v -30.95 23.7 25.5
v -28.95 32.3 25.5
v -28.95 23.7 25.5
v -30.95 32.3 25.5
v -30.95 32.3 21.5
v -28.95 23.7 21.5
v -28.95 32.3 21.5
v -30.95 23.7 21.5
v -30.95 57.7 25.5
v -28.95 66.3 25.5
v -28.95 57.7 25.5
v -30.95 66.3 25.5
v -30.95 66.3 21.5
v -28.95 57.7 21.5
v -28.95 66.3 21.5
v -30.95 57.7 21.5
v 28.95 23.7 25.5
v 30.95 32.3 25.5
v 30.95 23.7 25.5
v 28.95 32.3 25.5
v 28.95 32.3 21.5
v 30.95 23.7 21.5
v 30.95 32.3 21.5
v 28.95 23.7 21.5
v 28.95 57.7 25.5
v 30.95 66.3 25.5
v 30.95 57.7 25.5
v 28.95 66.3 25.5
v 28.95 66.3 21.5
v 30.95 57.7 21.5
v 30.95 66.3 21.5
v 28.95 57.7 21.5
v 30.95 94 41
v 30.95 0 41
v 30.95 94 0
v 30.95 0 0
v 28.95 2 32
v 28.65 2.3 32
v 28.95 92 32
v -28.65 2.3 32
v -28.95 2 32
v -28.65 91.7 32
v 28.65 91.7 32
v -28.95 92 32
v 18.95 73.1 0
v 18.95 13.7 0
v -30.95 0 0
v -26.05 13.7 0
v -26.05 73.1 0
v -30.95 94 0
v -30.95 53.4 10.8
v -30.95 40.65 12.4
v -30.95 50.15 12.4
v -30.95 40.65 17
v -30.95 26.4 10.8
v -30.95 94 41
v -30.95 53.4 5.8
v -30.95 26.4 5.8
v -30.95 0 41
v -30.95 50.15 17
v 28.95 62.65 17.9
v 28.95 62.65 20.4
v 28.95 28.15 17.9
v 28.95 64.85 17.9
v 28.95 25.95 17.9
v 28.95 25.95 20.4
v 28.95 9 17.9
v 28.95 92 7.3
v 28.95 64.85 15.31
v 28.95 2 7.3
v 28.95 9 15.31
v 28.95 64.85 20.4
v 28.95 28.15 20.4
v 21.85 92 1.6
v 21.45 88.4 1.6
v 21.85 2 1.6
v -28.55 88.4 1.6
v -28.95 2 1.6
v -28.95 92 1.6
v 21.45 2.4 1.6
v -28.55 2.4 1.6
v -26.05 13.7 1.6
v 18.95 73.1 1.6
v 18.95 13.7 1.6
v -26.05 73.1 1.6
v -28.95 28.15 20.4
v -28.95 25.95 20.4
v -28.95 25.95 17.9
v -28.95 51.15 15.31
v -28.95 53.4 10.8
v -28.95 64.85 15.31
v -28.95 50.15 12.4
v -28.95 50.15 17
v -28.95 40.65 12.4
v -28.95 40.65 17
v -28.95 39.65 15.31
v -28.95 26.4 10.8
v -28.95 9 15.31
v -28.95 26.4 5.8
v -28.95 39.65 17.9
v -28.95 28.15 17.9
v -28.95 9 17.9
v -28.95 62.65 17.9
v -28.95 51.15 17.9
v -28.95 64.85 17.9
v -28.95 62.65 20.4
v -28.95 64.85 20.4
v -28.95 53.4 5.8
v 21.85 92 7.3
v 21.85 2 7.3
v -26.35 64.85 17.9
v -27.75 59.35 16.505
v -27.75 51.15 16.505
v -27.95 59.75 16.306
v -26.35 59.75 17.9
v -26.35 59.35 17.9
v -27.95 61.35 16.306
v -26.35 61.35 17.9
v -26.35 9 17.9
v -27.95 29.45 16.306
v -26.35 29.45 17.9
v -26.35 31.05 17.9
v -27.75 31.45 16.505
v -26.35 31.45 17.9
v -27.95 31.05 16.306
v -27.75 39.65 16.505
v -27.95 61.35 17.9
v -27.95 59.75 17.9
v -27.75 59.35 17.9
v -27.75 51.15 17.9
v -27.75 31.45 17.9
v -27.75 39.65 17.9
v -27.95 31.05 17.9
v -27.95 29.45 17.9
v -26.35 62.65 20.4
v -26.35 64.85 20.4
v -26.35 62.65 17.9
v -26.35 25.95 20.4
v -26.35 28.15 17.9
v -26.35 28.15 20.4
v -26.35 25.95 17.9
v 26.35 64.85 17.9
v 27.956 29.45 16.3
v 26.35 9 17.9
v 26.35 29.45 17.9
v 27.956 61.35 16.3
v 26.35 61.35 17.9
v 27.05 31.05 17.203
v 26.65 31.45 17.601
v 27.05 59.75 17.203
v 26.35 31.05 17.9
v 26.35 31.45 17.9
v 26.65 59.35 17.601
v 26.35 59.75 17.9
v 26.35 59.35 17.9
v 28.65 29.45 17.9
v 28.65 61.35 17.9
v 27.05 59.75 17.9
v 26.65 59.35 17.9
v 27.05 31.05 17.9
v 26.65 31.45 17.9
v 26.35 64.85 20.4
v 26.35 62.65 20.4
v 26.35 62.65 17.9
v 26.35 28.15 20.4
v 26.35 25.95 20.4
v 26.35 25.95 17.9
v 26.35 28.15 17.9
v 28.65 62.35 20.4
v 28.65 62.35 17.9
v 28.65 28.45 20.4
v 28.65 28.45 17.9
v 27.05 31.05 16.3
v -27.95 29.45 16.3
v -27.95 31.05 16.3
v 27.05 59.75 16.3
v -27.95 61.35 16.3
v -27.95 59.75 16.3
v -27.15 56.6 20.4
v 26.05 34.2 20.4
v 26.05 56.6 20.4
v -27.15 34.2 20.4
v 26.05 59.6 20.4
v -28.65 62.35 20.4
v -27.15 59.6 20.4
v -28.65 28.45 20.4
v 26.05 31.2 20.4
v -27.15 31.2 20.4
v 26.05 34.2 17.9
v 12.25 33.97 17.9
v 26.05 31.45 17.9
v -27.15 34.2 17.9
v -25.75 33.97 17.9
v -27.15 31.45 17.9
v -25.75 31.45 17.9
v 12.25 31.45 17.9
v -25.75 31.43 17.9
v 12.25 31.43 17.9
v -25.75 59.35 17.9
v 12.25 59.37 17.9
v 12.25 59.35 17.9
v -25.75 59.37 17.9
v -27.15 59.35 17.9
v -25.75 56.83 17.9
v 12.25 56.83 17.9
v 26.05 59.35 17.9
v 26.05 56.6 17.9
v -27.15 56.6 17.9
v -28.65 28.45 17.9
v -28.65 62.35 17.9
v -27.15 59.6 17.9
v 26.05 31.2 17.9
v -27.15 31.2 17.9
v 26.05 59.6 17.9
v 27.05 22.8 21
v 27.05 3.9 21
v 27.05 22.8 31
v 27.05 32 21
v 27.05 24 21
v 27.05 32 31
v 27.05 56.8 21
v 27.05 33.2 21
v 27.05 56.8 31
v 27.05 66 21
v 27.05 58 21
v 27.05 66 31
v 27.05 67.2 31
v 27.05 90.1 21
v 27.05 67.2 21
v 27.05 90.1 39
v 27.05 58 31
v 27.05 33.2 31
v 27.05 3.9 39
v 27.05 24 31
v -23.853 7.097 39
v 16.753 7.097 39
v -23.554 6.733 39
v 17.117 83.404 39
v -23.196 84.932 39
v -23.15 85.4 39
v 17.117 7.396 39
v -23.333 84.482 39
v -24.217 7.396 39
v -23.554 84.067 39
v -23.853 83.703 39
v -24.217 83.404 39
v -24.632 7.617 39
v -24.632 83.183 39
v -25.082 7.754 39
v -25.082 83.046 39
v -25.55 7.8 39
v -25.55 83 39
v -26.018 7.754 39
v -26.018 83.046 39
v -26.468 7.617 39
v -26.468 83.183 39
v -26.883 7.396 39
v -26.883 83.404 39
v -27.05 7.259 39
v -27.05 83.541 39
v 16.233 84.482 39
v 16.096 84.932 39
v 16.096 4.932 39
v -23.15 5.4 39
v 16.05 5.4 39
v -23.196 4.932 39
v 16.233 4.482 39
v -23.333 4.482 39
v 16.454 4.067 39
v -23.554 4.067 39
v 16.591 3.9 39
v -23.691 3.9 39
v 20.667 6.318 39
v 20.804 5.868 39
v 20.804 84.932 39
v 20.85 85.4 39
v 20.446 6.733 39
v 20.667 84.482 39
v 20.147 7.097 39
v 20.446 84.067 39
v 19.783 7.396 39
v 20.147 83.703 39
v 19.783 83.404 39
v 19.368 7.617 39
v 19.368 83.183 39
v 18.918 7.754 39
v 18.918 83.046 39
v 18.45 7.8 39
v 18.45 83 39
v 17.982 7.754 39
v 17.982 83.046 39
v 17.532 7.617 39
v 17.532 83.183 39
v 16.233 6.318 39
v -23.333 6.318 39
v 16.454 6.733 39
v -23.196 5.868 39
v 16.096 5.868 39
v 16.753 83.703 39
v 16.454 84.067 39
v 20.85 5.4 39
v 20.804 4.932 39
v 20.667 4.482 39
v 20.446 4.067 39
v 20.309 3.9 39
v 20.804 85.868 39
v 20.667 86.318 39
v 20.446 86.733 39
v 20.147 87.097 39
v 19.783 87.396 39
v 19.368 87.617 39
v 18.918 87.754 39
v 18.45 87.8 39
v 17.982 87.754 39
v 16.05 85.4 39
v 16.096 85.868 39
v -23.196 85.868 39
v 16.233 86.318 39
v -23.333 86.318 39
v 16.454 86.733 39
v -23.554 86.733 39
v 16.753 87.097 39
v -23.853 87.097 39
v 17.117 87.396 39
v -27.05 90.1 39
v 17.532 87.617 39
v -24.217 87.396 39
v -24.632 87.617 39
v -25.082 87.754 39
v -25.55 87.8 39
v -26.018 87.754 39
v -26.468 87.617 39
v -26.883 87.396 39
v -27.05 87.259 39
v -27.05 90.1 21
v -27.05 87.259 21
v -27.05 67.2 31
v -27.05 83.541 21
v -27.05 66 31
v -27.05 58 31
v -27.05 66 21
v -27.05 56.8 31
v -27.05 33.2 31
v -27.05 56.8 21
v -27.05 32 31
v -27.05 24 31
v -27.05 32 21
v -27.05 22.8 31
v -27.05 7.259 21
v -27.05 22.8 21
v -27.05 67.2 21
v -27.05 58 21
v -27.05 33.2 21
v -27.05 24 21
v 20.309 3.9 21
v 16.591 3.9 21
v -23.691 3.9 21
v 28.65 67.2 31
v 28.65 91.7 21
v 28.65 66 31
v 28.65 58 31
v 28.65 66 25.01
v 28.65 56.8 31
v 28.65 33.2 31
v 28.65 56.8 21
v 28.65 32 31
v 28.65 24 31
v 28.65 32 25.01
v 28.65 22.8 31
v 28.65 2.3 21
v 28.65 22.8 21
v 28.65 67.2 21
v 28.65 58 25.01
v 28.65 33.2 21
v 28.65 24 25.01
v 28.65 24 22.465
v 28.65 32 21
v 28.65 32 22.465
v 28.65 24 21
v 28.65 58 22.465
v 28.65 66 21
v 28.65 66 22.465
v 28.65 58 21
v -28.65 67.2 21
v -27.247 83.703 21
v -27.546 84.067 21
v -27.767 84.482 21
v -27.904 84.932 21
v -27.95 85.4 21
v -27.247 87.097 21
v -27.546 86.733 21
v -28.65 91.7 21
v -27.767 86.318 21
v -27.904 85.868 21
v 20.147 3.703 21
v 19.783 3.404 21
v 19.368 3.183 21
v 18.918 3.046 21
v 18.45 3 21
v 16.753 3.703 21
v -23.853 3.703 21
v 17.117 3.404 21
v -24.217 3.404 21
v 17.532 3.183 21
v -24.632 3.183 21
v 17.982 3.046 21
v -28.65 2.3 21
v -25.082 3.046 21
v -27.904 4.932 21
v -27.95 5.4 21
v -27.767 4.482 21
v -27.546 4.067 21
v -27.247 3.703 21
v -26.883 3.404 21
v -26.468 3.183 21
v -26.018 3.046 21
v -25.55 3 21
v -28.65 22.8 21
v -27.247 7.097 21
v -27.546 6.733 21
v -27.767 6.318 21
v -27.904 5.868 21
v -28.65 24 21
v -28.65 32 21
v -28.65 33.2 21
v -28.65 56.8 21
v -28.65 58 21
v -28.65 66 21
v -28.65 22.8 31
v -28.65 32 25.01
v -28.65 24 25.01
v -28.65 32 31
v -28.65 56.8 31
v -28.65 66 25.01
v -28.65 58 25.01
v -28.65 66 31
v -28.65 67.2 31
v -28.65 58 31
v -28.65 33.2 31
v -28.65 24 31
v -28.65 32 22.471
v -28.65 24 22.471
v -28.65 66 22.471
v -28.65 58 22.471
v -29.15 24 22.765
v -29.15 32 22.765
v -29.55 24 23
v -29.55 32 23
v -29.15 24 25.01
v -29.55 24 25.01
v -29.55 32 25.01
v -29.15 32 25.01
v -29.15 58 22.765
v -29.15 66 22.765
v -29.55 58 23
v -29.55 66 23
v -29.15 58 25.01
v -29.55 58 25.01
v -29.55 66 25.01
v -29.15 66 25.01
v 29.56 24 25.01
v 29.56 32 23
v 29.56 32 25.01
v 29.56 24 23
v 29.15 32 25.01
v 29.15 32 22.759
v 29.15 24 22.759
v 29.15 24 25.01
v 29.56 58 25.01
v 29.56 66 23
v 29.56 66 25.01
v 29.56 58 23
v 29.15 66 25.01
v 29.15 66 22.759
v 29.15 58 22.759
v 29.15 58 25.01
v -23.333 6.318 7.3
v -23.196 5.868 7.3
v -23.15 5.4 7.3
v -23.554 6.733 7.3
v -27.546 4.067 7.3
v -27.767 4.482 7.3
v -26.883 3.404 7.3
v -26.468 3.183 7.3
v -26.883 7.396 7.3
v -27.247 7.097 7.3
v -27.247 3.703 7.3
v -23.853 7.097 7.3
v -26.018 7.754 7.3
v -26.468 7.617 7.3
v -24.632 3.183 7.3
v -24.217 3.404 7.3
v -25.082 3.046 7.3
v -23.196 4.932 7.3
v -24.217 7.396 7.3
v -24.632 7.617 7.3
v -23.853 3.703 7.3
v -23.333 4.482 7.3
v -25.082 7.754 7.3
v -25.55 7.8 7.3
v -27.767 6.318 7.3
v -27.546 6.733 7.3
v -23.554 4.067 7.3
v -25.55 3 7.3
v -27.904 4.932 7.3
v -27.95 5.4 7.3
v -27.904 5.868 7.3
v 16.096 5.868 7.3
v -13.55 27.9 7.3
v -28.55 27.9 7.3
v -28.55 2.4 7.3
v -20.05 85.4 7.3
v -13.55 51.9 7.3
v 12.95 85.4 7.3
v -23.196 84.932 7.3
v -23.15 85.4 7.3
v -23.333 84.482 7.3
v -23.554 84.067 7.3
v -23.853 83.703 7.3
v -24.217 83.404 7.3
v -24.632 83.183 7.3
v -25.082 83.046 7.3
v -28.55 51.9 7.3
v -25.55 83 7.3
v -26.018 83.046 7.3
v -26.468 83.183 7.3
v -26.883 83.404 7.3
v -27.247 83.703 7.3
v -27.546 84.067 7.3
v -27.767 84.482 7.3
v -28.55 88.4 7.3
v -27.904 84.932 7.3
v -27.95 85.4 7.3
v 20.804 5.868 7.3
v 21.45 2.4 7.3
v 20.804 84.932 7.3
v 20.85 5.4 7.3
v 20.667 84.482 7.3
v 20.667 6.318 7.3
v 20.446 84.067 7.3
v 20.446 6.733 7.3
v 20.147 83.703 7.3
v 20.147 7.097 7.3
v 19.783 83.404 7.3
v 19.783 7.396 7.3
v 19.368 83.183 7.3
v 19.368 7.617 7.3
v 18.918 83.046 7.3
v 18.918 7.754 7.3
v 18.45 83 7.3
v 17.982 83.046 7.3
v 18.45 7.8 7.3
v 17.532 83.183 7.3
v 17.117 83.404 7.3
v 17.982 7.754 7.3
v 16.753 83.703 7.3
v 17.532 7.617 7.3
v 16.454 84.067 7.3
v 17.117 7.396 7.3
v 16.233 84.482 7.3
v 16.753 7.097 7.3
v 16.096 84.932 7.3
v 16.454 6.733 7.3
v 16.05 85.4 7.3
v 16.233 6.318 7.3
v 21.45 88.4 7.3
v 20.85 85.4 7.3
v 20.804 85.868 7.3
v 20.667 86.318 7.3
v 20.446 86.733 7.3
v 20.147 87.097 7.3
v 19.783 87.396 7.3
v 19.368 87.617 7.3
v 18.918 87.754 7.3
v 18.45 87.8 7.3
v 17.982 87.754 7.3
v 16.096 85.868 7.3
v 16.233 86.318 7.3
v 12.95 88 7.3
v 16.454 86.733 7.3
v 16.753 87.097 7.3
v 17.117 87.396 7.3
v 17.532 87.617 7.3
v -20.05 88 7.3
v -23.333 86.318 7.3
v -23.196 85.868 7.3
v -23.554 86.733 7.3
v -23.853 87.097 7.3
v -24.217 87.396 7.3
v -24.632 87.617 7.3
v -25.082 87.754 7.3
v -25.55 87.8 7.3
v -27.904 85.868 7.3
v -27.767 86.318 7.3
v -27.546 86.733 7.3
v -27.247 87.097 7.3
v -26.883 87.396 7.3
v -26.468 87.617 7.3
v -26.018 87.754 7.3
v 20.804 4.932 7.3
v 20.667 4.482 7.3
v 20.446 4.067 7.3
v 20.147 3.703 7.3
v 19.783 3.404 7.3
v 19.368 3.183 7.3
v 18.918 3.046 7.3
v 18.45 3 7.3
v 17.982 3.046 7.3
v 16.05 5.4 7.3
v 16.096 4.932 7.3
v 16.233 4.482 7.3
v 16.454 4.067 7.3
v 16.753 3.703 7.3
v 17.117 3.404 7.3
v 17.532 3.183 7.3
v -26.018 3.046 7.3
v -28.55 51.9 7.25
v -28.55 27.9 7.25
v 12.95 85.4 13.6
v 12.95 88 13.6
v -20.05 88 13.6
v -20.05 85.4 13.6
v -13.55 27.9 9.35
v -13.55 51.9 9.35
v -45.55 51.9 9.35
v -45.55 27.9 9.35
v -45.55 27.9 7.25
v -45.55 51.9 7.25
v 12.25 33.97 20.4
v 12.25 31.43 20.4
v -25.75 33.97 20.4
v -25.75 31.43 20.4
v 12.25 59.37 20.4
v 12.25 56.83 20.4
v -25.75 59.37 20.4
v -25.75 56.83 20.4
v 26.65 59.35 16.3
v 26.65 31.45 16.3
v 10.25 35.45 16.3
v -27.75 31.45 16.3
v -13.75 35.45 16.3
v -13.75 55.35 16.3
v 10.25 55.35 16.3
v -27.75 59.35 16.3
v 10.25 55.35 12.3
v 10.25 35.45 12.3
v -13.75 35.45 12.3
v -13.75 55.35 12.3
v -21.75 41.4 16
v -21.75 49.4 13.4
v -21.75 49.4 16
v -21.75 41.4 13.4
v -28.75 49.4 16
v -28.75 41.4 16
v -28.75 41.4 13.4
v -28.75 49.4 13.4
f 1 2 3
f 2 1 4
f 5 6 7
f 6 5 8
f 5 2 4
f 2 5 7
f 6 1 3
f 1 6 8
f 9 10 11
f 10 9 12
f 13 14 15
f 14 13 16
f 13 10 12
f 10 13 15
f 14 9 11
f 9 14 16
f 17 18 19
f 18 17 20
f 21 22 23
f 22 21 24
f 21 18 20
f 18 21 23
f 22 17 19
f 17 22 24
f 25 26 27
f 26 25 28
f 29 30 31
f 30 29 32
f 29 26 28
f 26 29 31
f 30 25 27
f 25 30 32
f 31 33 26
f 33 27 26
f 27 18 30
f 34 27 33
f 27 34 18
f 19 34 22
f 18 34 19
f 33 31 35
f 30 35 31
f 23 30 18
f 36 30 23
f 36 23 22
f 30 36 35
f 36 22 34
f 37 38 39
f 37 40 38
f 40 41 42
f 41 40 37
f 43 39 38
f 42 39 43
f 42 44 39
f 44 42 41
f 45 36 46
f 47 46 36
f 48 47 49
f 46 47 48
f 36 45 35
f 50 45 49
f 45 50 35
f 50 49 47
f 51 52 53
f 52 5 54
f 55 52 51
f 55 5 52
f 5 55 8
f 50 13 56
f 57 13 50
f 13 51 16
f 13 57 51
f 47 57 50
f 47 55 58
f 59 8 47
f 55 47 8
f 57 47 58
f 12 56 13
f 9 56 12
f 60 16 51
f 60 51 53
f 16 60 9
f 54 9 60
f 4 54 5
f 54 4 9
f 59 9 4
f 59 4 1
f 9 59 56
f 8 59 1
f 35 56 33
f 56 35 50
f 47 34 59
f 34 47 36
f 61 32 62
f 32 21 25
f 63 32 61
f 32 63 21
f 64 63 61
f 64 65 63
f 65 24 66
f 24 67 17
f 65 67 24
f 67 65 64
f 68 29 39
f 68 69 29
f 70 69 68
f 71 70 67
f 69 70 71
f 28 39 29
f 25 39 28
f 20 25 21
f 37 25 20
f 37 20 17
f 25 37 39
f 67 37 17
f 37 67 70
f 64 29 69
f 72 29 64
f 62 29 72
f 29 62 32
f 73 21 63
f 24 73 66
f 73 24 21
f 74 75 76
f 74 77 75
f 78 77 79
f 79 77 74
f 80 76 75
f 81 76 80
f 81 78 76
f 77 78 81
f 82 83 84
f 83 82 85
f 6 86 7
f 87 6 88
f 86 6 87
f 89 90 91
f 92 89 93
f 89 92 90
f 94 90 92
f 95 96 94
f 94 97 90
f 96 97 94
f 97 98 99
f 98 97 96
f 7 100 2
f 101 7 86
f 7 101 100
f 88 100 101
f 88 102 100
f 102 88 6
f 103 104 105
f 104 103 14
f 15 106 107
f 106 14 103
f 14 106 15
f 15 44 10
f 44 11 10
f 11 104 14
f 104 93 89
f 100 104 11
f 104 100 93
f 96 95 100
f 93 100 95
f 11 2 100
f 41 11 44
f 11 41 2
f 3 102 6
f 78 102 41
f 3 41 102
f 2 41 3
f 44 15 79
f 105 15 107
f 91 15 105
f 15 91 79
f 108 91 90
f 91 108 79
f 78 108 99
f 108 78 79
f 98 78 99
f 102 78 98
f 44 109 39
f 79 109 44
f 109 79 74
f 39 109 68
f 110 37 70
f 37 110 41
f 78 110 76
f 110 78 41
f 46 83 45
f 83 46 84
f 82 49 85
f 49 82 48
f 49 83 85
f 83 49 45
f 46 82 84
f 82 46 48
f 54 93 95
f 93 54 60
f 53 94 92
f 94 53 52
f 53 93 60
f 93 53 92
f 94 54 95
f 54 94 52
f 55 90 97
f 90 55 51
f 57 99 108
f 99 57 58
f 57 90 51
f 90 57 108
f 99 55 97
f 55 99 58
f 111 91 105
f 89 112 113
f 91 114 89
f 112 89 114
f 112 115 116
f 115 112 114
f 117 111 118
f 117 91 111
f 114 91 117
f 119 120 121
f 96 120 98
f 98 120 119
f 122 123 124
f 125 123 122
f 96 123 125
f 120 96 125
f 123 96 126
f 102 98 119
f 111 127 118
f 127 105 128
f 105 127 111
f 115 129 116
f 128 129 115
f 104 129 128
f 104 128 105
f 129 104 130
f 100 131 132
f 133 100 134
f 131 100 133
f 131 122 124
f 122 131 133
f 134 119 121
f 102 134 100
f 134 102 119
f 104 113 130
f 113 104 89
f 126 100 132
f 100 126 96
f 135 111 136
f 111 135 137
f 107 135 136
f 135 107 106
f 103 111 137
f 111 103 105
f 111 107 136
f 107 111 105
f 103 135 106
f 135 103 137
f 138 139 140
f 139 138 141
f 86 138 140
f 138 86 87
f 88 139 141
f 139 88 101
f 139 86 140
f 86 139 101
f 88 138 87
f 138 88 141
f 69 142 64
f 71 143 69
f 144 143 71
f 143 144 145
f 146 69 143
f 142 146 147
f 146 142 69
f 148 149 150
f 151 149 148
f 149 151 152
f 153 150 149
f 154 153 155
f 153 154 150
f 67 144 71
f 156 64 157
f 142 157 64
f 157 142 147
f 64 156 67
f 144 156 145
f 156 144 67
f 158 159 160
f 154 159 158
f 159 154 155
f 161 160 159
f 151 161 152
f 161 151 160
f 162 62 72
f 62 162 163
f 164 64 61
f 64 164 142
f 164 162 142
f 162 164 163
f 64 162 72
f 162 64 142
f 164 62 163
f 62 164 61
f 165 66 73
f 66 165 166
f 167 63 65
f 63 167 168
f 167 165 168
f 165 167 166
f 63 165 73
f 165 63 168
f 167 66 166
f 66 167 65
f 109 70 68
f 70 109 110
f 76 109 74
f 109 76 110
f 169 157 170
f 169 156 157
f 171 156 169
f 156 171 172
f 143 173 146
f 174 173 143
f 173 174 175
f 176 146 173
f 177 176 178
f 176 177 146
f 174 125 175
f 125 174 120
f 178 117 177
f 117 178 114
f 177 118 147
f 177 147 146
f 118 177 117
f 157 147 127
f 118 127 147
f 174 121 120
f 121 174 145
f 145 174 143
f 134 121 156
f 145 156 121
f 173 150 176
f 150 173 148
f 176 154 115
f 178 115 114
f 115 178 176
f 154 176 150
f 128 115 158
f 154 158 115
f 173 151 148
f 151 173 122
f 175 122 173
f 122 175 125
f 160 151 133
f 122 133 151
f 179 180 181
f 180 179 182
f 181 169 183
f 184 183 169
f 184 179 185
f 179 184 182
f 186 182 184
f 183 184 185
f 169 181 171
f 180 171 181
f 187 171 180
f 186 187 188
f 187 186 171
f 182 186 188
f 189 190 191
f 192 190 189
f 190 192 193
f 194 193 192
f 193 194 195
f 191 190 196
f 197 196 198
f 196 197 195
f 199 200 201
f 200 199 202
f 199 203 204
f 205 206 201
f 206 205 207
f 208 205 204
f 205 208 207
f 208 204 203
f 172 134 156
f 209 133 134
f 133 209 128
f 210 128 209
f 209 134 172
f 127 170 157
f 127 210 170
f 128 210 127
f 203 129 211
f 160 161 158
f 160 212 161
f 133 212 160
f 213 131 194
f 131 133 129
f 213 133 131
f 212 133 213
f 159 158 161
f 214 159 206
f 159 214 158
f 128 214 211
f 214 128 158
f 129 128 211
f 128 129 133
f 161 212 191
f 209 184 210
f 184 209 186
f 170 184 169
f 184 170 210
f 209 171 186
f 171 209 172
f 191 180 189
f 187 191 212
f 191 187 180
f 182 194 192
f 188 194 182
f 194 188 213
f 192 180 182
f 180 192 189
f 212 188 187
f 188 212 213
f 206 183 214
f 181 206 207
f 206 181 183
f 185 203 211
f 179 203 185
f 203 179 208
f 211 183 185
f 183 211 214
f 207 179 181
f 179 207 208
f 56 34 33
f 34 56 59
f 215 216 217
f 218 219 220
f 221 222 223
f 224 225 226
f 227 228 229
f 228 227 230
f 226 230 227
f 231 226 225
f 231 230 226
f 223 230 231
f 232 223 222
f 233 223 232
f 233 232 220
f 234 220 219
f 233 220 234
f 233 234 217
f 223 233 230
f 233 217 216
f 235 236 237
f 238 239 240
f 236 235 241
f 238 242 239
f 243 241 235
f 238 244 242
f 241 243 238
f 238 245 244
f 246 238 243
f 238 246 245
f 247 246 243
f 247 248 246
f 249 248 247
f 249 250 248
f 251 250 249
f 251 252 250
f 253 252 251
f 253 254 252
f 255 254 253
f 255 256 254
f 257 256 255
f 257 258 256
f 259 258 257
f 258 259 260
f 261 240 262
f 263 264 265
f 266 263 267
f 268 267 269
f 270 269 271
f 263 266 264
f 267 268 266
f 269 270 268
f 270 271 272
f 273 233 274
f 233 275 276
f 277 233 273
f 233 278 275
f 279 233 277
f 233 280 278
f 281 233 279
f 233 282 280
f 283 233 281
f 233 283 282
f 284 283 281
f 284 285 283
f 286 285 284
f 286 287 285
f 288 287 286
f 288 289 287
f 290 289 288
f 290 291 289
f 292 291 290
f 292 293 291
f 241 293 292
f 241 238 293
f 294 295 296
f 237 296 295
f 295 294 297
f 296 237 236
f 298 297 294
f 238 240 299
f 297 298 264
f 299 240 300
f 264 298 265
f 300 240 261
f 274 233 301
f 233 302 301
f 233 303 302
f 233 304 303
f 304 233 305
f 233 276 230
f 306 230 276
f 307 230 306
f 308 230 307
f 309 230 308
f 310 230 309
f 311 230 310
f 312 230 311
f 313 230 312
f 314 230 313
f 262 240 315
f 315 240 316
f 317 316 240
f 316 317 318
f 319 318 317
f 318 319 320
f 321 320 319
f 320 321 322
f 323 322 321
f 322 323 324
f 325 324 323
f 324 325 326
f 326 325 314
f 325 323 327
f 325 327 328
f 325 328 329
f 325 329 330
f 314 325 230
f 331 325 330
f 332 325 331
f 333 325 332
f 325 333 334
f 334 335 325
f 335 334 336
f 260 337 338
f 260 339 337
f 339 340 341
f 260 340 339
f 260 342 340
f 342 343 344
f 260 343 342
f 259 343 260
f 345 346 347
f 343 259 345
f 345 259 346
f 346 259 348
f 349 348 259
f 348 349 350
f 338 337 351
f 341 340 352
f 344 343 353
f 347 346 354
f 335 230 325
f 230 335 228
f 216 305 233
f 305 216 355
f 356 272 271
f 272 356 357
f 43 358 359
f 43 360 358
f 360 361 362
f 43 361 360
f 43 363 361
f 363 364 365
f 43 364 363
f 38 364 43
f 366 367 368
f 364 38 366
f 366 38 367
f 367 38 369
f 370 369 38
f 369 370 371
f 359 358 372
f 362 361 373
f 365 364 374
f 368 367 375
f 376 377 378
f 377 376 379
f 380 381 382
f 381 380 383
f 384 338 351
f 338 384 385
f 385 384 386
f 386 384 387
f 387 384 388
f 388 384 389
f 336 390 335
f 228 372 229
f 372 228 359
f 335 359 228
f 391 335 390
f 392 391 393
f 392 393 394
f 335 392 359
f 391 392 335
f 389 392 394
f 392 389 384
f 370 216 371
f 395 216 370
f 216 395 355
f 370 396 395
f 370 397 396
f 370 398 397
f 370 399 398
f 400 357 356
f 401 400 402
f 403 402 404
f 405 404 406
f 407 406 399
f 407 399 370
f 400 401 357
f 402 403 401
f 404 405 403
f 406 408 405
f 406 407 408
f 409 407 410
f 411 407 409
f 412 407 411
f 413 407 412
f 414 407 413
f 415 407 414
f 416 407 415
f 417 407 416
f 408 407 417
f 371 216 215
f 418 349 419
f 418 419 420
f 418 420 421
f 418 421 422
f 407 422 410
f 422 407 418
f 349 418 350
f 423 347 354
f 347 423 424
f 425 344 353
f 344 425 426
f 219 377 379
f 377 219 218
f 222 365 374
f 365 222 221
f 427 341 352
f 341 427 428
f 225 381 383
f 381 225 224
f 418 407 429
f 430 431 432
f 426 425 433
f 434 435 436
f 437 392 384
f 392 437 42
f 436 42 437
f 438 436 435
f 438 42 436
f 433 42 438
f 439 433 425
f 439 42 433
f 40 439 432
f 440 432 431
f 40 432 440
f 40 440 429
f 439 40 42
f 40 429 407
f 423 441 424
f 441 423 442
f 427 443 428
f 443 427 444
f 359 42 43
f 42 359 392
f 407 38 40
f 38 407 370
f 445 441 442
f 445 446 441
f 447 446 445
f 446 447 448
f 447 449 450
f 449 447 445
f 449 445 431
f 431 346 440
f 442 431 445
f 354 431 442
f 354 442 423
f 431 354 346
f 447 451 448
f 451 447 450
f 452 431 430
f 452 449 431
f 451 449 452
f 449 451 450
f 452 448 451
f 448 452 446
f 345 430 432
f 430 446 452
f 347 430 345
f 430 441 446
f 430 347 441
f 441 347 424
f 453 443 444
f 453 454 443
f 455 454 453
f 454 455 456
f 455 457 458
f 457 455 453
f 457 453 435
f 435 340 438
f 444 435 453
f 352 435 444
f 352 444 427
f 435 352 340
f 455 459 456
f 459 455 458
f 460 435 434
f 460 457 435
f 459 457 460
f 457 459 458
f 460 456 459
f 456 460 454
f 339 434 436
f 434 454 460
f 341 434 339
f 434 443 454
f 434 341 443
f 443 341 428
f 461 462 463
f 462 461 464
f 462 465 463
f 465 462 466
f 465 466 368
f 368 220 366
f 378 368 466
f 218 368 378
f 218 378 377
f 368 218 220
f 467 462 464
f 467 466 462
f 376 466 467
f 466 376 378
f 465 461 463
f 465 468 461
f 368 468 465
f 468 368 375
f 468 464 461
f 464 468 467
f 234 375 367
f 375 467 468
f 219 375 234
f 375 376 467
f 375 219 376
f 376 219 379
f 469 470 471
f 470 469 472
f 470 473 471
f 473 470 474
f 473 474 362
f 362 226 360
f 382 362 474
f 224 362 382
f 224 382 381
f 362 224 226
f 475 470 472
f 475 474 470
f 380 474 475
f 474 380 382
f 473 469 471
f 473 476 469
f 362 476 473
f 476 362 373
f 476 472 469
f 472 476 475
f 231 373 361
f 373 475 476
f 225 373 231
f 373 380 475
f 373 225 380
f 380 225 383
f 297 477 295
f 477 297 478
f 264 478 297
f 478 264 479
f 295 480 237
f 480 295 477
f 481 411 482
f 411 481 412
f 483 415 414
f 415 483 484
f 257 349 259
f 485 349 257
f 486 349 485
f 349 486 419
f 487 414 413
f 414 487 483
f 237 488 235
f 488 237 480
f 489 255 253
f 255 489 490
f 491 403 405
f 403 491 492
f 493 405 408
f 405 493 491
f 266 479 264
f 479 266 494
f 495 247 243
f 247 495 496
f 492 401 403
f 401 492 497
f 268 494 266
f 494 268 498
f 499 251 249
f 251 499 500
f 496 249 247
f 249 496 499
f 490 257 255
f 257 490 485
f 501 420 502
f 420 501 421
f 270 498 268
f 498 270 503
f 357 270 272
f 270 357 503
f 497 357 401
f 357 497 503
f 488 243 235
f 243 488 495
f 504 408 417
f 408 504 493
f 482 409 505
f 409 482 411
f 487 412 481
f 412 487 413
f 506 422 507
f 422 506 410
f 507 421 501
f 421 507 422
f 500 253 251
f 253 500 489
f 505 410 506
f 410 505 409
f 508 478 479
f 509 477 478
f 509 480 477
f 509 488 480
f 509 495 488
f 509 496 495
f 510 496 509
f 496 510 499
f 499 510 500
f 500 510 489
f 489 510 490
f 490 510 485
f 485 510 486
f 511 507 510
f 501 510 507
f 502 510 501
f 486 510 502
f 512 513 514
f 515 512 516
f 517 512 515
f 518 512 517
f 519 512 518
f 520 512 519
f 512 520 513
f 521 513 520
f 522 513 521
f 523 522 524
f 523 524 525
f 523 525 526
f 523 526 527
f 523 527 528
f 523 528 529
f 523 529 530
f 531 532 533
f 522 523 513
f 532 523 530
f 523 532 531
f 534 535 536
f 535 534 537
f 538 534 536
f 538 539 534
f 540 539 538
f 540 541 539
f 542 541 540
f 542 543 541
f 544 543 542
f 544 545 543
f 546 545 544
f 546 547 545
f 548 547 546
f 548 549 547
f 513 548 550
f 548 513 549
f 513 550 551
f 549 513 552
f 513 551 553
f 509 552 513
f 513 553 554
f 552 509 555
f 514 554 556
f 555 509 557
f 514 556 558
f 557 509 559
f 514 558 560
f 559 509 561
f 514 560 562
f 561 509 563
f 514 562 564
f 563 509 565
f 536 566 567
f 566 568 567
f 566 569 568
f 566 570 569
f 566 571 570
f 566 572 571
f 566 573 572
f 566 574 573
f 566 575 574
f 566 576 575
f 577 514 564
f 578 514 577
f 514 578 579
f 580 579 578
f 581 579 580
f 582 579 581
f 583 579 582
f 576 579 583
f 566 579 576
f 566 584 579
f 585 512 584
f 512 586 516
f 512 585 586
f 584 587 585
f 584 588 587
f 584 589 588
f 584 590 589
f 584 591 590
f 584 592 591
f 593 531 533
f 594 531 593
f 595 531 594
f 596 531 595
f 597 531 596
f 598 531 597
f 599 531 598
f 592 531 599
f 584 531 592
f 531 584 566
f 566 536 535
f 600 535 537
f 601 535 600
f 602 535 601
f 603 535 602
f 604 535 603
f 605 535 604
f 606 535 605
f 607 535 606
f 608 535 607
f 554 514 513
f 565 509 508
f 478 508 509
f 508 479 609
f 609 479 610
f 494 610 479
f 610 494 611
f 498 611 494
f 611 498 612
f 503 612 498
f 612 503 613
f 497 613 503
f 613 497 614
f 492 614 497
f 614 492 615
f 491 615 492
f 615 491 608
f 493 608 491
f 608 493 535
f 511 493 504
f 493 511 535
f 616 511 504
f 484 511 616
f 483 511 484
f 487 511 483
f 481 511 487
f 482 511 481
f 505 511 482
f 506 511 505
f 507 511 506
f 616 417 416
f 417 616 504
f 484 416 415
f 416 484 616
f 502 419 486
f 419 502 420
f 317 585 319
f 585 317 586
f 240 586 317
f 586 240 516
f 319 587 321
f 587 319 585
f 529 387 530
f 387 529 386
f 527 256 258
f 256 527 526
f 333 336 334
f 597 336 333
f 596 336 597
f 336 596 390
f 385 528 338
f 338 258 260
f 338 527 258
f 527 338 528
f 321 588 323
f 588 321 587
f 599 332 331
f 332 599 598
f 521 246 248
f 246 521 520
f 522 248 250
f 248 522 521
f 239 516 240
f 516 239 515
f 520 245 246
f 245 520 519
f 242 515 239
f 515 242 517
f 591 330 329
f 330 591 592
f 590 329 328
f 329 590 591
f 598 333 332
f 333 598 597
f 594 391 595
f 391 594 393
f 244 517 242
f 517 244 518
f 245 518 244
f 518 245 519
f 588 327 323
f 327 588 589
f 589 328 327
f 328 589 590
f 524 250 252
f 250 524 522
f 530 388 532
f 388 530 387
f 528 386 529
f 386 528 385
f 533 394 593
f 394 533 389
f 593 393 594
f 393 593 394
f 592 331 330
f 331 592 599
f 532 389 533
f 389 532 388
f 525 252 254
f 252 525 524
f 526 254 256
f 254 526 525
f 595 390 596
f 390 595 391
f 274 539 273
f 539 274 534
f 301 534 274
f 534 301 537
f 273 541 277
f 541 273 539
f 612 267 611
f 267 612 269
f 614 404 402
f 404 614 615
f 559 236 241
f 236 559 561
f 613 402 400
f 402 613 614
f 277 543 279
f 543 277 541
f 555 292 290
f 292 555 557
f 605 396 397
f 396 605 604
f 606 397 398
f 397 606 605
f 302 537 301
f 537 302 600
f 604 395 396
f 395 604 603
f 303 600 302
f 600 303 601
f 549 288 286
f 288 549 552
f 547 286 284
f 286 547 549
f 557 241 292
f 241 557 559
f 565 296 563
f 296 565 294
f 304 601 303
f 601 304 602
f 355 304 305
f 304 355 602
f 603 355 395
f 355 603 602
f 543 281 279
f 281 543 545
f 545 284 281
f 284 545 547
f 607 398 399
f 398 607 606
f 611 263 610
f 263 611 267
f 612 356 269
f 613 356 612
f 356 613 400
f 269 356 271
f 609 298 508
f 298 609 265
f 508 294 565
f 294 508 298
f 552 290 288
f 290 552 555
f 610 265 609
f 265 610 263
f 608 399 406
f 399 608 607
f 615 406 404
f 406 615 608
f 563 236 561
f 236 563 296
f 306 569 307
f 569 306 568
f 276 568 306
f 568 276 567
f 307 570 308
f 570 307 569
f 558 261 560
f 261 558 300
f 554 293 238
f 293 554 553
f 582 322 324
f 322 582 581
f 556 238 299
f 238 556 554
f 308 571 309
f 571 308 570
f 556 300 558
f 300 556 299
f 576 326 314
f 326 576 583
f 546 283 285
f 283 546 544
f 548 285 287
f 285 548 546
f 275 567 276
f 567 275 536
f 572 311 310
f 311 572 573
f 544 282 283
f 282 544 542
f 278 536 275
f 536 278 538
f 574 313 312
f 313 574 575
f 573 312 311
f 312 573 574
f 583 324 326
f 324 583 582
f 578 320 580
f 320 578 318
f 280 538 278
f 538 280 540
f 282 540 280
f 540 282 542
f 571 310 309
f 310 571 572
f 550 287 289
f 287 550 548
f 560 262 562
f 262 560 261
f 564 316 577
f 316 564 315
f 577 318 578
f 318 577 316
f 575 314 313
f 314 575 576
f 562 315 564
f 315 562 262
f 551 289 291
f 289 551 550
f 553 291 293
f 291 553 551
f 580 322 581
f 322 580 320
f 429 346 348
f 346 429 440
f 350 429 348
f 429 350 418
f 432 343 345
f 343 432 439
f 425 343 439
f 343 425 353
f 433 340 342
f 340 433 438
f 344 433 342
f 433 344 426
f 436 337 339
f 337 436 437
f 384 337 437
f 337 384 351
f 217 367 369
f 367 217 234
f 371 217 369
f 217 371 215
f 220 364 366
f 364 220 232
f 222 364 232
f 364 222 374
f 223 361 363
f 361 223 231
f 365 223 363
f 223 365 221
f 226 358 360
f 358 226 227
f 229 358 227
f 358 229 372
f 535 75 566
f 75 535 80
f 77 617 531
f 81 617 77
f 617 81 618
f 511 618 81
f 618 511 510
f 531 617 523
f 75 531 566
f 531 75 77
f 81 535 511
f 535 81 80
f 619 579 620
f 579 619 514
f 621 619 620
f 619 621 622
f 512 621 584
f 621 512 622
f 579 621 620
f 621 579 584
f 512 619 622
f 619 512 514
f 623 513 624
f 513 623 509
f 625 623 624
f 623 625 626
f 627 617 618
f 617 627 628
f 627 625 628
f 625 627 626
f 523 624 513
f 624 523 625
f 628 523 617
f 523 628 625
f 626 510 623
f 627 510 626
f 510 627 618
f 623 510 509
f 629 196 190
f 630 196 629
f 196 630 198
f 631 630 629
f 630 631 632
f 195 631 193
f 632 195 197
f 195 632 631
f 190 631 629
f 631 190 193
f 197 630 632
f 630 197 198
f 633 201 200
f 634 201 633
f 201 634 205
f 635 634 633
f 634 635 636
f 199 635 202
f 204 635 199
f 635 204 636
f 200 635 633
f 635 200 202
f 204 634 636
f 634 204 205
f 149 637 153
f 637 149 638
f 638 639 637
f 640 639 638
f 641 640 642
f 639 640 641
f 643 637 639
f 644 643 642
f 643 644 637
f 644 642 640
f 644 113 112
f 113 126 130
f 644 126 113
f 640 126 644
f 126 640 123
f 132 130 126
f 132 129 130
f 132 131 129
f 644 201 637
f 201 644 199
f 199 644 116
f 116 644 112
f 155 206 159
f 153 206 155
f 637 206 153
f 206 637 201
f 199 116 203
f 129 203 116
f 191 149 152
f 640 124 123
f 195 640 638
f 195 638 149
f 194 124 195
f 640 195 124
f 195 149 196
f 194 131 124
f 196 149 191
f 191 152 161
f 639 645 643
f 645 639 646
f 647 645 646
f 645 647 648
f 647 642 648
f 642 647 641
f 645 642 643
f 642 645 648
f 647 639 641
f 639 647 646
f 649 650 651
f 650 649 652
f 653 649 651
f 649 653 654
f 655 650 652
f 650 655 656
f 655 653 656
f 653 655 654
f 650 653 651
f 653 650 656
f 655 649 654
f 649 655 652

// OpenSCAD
// ESP32 Marauder v4 case for a generic 30-pin ESP32 DevKit (USB-C, CH340) + 2.8" ILI9341 SPI screen.
// Three parts: "shell" (front bezel + walls + rails), "plate" (ESP32 tray, drops onto the rails) and
// "lid" (back cover + snap arms + screen pillars). All three print without supports.
//
// Coordinates: X across the width (centered), Y along the length (Y=0 is the USB end),
// Z from the front face (Z=0, the screen side) to the back.
//
// Render one part:  openscad -D 'part="shell"' -o shell.stl devkit_case.scad
//   part = "shell" | "plate_print" | "lid_print" | "assembly"   (plate / lid are the as-fitted orientation for "plate"/"lid")

part = "assembly";
$fn = 32;

// ---- measured / assumed dimensions (mm) -------------------------------------------------
// Screen module (Marauder Screen PCB Measurements.png + your 12 mm thickness)
scr_w = 50;            // PCB width
scr_l = 86;            // PCB length
scr_t = 12;            // total thickness, glass front to rear-most part (you measured 1.2 cm)
scr_pcb_back = 5.7;    // measured: glass front to the back face of the PCB
scr_hole = 3;          // mounting hole centres are 3 mm in from each PCB edge
active_w = 43.2;       // ILI9341 2.8" active area (portrait)
active_l = 57.6;
glass_top = 6.4;       // PCB top edge to glass top edge
glass_len = 69.2;      // glass length

// ESP32 dev board (ESP32-WROOM-32 DevKitC style, micro-USB). ASSUMED ~54.4 x 27.9 mm; adjust to your board.
// The board lies ACROSS the case (its length along X) with the micro-USB facing the left wall,
// the same side as the SD slot, component side toward the screen, pins toward the back.
esp_l = 54.4;
esp_w = 27.9;
esp_pcb_t = 1.6;
esp_comp_h = 4.0;      // tallest part on the component side (module, buttons) ~3.3 + margin
esp_row = 25.4;        // distance between the two pin rows
hdr_plastic = 2.5;     // black plastic spacer of the pin header
usb_w = 9.5;           // micro-USB cutout (plug metal is ~7 x 2.5; the moulded plug stays outside the wall)
usb_h = 4.6;

// Case
wall = 2.0;
clr = 0.4;             // clearance around the screen
front_t = 1.6;         // front plate thickness
slack_far = 3.2;       // extra room at the header end of the screen for dupont plugs
z_seam = 32;           // shell/lid split plane
z_total = 41;          // overall depth (room for 14 mm dupont plugs + wire bend behind the ESP32)
back_t = 2.0;

esp_x_gap = 1.2;                       // PCB end to the left wall (the micro-USB shell sticks out ~1 mm past the PCB)
rim_t = 1.6;                           // rim around the ESP32 on the plate
iw = esp_x_gap + esp_l + 0.4 + rim_t + 0.3;   // inner width, set by the ESP32 lying across the case (~58 mm)
il = scr_l + 2 * clr + slack_far;      // inner length
ow = iw + 2 * wall;                    // outer width
ol = il + 2 * wall;                    // outer length

scr_y0 = wall + clr;                   // screen top edge inside the case
scr_cx = -iw/2 + clr + scr_w/2;        // screen sits against the left wall (SD card side); a filler rib takes up the rest

// ESP32 plate: board component side faces the screen, pins point to the back
scr_rear = scr_pcb_back + front_t + 2.0;              // rear of screen body incl. ICs (+2 mm assumed)
esp_lift = 2.5;                                       // keeps the micro-USB cutout clear of the SD-card opening below it
esp_pcb_front = scr_rear + 0.5 + esp_comp_h + esp_lift;
plate_z0 = esp_pcb_front + esp_pcb_t;                 // board back face rests on the plate
plate_t = hdr_plastic;
esp_x0 = -iw/2 + esp_x_gap;                           // USB end of the board (left wall side)
esp_x1 = esp_x0 + esp_l;
esp_yc = scr_y0 + scr_l/2;                            // board centred along the screen's length
esp_y0 = esp_yc - esp_w/2;
esp_y1 = esp_yc + esp_w/2;
usb_z = esp_pcb_front - 1.6;                          // port centre height

// micro-SD access on the screen module (slot is on the back of the PCB, card enters from a long edge)
sd_side = -1;                          // -1 = left wall, +1 = right wall (looking at the glass, header end at the bottom)
sd_from_hdr = 48.5;                    // ESTIMATED from a photo: slot centre, mm from the header edge of the screen
sd_len = 27;                           // opening length: a full-size SD card in an adapter is ~24 mm wide
sd_h = 5.0;                            // opening height (card is ~2.1 mm thick; extra for the height uncertainty)
sd_z0 = front_t + scr_pcb_back - 1.5;  // starts a little in front of the back face of the screen PCB

// ESP32 plate rails (45 degree underside, so no supports)
ledge_w = 2.6;
ledge_y0 = 9;                          // start after the screen-pillar clearance
plate_y0 = esp_y0 - 3;
plate_y1 = esp_y1 + 3;
plate_clr = 0.3;

// snap-fit
lip_t = 1.6;
lip_z0 = plate_z0 + plate_t + 0.6;   // lip starts just behind the ESP32 plate
arm_w = 8;
arm_ys = [28, 62];
bump = 0.9;
win_z0 = lip_z0 + 0.5; win_z1 = lip_z0 + 4.5;

module box(x0, y0, z0, x1, y1, z1) {
    translate([x0, y0, z0]) cube([x1 - x0, y1 - y0, z1 - z0]);
}

// ---------------------------------------------------------------------------------------
module shell() {
    difference() {
        box(-ow/2, 0, 0, ow/2, ol, z_seam);
        // cavity
        box(-iw/2, wall, front_t, iw/2, wall + il, z_seam + 1);
        // display window (centred on the glass)
        translate([scr_cx, scr_y0 + glass_top + glass_len/2, -1])
            translate([-(active_w + 1.8)/2, -(active_l + 1.8)/2, 0])
                cube([active_w + 1.8, active_l + 1.8, front_t + 2]);
        // micro-USB cutout in the left wall, in line with the board's port
        box(-ow/2 - 1, esp_yc - usb_w/2, usb_z - usb_h/2, -iw/2 + 1, esp_yc + usb_w/2, usb_z + usb_h/2);
        // snap windows in the long walls
        for (s = [-1, 1]) for (y = arm_ys)
            box(s > 0 ? iw/2 - 1 : -ow/2 - 1, y - arm_w/2 - 0.3, win_z0,
                s > 0 ? ow/2 + 1 : -iw/2 + 1, y + arm_w/2 + 0.3, win_z1);
        // micro-SD opening in the left wall: a plain rectangle wide enough for a full-size card (the roof bridges ~27 mm)
        sd_yc = scr_y0 + scr_l - sd_from_hdr;
        box(sd_side > 0 ? iw/2 - 1 : -ow/2 - 1, sd_yc - sd_len/2, sd_z0,
            sd_side > 0 ? ow/2 + 1 : -iw/2 + 1, sd_yc + sd_len/2, sd_z0 + sd_h);
    }
    // filler rib along the right side of the screen, so the screen can't slide sideways
    box(scr_cx + scr_w/2 + 0.4, wall, front_t, iw/2, wall + il, front_t + scr_pcb_back);
    // rails the ESP32 plate rests on (45 degree underside) + stop tabs at both ends
    for (sx = [-1, 1]) {
        difference() {
            translate([0, plate_y1 + 2.5, 0]) rotate([90, 0, 0]) linear_extrude(plate_y1 + 2.5 - ledge_y0)
                polygon([[sx * (iw/2 + 0.01), plate_z0], [sx * (iw/2 - ledge_w), plate_z0], [sx * (iw/2 + 0.01), plate_z0 - ledge_w]]);
            // keep the left rail clear of the USB plug
            if (sx < 0) box(-iw/2 - 1, esp_yc - usb_w/2 - 1, 0, -iw/2 + ledge_w + 1, esp_yc + usb_w/2 + 1, plate_z0 + 1);
        }
        box(sx > 0 ? iw/2 - ledge_w : -iw/2 - 0.01, plate_y1 + 0.3, plate_z0,
            sx > 0 ? iw/2 + 0.01 : -iw/2 + ledge_w, plate_y1 + 2.5, plate_z0 + plate_t);
        box(sx > 0 ? iw/2 - ledge_w : -iw/2 - 0.01, plate_y0 - 2.5, plate_z0,
            sx > 0 ? iw/2 + 0.01 : -iw/2 + ledge_w, plate_y0 - 0.3, plate_z0 + plate_t);
    }
}

// ---------------------------------------------------------------------------------------
// ESP32 tray: board (chip side toward the screen) rests on its front face, pin headers pass through the slots.
module esp_plate() {
    difference() {
        union() {
            box(-iw/2 + plate_clr, plate_y0, plate_z0, iw/2 - plate_clr, plate_y1, plate_z0 + plate_t);
            // rim around the board footprint (open at the USB end: the board's end sits at the wall)
            difference() {
                box(esp_x0 - 0.2, esp_y0 - 0.4 - rim_t, plate_z0 - esp_pcb_t, esp_x1 + 0.4 + rim_t, esp_y1 + 0.4 + rim_t, plate_z0 + 0.01);
                box(esp_x0 - 1, esp_y0 - 0.4, plate_z0 - esp_pcb_t - 1, esp_x1 + 0.4, esp_y1 + 0.4, plate_z0 + 1);
            }
        }
        // slots for the two pin-header plastics (whole board length so pin positions don't matter)
        for (s = [-1, 1])
            box(esp_x0 + 0.6, esp_yc + s * esp_row/2 - 1.5, plate_z0 - 3, esp_x1 - 0.6, esp_yc + s * esp_row/2 + 1.5, plate_z0 + plate_t + 1);
        // clearance for the lid's screen pillars (only the ones that fall inside the plate)
        for (s = [-1, 1]) translate([scr_cx + s * (scr_w/2 - scr_hole), scr_y0 + scr_hole, plate_z0 - 3])
            cylinder(d = 7, h = plate_t + 6);
    }
}

// ---------------------------------------------------------------------------------------
module lid() {
    lo_w = iw - 0.6;   // lip outer size (0.3 mm clearance each side)
    lo_l = il - 0.6;
    difference() {
        union() {
            // outer skin, flush with the shell
            // (the cavity is the lip's inner size, so the lip stands on solid wall and prints without supports)
            difference() {
                box(-ow/2, 0, z_seam, ow/2, ol, z_total);
                box(-lo_w/2 + lip_t, wall + 0.3 + lip_t, z_seam - 1, lo_w/2 - lip_t, wall + 0.3 + lo_l - lip_t, z_total - back_t);
            }
            // lip that slides into the shell
            difference() {
                box(-lo_w/2, wall + 0.3, lip_z0, lo_w/2, wall + 0.3 + lo_l, z_seam + 0.01);
                box(-lo_w/2 + lip_t, wall + 0.3 + lip_t, lip_z0 - 1, lo_w/2 - lip_t, wall + 0.3 + lo_l - lip_t, z_seam + 1);
            }
            // snap bumps on the arms
            for (s = [-1, 1]) for (y = arm_ys) snap_bump(s, y, lo_w);
            // pillars pressing on the screen PCB corners
            for (sx = [-1, 1]) for (yy = [scr_y0 + scr_hole, scr_y0 + scr_l - scr_hole])
                translate([scr_cx + sx * (scr_w/2 - scr_hole), yy, front_t + scr_pcb_back])
                    cylinder(d = 4.8, h = z_total - back_t - (front_t + scr_pcb_back) + 0.01);
        }
        // arm slits (U-shape leaves a cantilever attached at the seam)
        for (s = [-1, 1]) for (y = arm_ys) {
            for (dy = [-1, 1])
                box(s > 0 ? lo_w/2 - lip_t - 0.5 : -lo_w/2 - 0.5, y + dy * (arm_w/2 + 0.6) - 0.6, lip_z0 - 1,
                    s > 0 ? lo_w/2 + 0.5 : -lo_w/2 + lip_t + 0.5, y + dy * (arm_w/2 + 0.6) + 0.6, z_seam - 1.0);
        }
    }
}

module snap_bump(s, y, lo_w) {
    // wedge: ramp on the front (insertion) side, square shoulder on the back side
    x_in = s * (lo_w/2 - lip_t/2);
    x_out = s * (lo_w/2 + bump);
    hull() {
        translate([x_in, y - arm_w/2, win_z0 + 0.5]) cube([0.01, arm_w, 0.01]);
        translate([x_out, y - arm_w/2, win_z0 + 1.5]) cube([0.01, arm_w, 0.01]);
        translate([x_out, y - arm_w/2, win_z1 - 0.5]) cube([0.01, arm_w, 0.01]);
        translate([x_in, y - arm_w/2, win_z1 - 0.5]) cube([0.01, arm_w, 0.01]);
    }
}

// ---------------------------------------------------------------------------------------
// dummy parts, used only to check clearances in the assembly view
module dummy_screen() {
    color("green") translate([scr_cx - scr_w/2, scr_y0, front_t]) cube([scr_w, scr_l, scr_pcb_back]);
    color("navy") translate([scr_cx - scr_w/2, scr_y0 + glass_top, front_t]) cube([scr_w, glass_len, 0.1]);
    // header + plugs at the far edge
    color("gray") translate([scr_cx - 16.5, scr_y0 + scr_l - 3, front_t + scr_pcb_back]) cube([33, 2.6, scr_t - scr_pcb_back]);
    // SD card in its adapter, sticking out of the left edge (24 x 32 x 2.1)
    color("blue") translate([scr_cx - scr_w/2 - 17, scr_y0 + scr_l - sd_from_hdr - 12, sd_z0 + (sd_h - 2.1)/2]) cube([32, 24, 2.1]);
}
module dummy_esp() {
    color("red") translate([esp_x0, esp_y0, plate_z0 - esp_pcb_t]) cube([esp_l, esp_w, esp_pcb_t]);
    color("orange") translate([esp_x0 + 14, esp_y0 + 4, plate_z0 - esp_pcb_t - esp_comp_h]) cube([24, esp_w - 8, esp_comp_h]);
    color("silver") translate([esp_x0 - 1, esp_yc - 4, usb_z - 1.3]) cube([7, 8, 2.6]);
    for (s = [-1, 1]) color("black") translate([esp_x0 + 2, esp_yc + s * esp_row/2 - 1.27, plate_z0]) cube([38, 2.54, hdr_plastic]);
}

if (part == "shell") shell();
else if (part == "plate") esp_plate();
else if (part == "plate_print") translate([0, plate_y1, plate_z0 + plate_t]) rotate([180, 0, 0]) esp_plate();   // back face on the bed, rim up
else if (part == "lid") lid();
else if (part == "lid_print") translate([0, ol, z_total]) rotate([180, 0, 0]) lid();   // back plate on the bed
else if (part == "print") {
    shell();
    translate([ow + 10, 0, 0]) translate([0, ol, z_total]) rotate([180, 0, 0]) lid();
}
else if (part == "ghost") {      // the parts the case was designed around, in the shell's coordinates (for the STL viewer's ghost overlay)
    dummy_screen();
    dummy_esp();
}
else if (part == "assembly") {
    color("lightblue", 0.6) shell();
    color("khaki", 0.8) esp_plate();
    color("salmon", 0.6) lid();
    dummy_screen();
    dummy_esp();
}
